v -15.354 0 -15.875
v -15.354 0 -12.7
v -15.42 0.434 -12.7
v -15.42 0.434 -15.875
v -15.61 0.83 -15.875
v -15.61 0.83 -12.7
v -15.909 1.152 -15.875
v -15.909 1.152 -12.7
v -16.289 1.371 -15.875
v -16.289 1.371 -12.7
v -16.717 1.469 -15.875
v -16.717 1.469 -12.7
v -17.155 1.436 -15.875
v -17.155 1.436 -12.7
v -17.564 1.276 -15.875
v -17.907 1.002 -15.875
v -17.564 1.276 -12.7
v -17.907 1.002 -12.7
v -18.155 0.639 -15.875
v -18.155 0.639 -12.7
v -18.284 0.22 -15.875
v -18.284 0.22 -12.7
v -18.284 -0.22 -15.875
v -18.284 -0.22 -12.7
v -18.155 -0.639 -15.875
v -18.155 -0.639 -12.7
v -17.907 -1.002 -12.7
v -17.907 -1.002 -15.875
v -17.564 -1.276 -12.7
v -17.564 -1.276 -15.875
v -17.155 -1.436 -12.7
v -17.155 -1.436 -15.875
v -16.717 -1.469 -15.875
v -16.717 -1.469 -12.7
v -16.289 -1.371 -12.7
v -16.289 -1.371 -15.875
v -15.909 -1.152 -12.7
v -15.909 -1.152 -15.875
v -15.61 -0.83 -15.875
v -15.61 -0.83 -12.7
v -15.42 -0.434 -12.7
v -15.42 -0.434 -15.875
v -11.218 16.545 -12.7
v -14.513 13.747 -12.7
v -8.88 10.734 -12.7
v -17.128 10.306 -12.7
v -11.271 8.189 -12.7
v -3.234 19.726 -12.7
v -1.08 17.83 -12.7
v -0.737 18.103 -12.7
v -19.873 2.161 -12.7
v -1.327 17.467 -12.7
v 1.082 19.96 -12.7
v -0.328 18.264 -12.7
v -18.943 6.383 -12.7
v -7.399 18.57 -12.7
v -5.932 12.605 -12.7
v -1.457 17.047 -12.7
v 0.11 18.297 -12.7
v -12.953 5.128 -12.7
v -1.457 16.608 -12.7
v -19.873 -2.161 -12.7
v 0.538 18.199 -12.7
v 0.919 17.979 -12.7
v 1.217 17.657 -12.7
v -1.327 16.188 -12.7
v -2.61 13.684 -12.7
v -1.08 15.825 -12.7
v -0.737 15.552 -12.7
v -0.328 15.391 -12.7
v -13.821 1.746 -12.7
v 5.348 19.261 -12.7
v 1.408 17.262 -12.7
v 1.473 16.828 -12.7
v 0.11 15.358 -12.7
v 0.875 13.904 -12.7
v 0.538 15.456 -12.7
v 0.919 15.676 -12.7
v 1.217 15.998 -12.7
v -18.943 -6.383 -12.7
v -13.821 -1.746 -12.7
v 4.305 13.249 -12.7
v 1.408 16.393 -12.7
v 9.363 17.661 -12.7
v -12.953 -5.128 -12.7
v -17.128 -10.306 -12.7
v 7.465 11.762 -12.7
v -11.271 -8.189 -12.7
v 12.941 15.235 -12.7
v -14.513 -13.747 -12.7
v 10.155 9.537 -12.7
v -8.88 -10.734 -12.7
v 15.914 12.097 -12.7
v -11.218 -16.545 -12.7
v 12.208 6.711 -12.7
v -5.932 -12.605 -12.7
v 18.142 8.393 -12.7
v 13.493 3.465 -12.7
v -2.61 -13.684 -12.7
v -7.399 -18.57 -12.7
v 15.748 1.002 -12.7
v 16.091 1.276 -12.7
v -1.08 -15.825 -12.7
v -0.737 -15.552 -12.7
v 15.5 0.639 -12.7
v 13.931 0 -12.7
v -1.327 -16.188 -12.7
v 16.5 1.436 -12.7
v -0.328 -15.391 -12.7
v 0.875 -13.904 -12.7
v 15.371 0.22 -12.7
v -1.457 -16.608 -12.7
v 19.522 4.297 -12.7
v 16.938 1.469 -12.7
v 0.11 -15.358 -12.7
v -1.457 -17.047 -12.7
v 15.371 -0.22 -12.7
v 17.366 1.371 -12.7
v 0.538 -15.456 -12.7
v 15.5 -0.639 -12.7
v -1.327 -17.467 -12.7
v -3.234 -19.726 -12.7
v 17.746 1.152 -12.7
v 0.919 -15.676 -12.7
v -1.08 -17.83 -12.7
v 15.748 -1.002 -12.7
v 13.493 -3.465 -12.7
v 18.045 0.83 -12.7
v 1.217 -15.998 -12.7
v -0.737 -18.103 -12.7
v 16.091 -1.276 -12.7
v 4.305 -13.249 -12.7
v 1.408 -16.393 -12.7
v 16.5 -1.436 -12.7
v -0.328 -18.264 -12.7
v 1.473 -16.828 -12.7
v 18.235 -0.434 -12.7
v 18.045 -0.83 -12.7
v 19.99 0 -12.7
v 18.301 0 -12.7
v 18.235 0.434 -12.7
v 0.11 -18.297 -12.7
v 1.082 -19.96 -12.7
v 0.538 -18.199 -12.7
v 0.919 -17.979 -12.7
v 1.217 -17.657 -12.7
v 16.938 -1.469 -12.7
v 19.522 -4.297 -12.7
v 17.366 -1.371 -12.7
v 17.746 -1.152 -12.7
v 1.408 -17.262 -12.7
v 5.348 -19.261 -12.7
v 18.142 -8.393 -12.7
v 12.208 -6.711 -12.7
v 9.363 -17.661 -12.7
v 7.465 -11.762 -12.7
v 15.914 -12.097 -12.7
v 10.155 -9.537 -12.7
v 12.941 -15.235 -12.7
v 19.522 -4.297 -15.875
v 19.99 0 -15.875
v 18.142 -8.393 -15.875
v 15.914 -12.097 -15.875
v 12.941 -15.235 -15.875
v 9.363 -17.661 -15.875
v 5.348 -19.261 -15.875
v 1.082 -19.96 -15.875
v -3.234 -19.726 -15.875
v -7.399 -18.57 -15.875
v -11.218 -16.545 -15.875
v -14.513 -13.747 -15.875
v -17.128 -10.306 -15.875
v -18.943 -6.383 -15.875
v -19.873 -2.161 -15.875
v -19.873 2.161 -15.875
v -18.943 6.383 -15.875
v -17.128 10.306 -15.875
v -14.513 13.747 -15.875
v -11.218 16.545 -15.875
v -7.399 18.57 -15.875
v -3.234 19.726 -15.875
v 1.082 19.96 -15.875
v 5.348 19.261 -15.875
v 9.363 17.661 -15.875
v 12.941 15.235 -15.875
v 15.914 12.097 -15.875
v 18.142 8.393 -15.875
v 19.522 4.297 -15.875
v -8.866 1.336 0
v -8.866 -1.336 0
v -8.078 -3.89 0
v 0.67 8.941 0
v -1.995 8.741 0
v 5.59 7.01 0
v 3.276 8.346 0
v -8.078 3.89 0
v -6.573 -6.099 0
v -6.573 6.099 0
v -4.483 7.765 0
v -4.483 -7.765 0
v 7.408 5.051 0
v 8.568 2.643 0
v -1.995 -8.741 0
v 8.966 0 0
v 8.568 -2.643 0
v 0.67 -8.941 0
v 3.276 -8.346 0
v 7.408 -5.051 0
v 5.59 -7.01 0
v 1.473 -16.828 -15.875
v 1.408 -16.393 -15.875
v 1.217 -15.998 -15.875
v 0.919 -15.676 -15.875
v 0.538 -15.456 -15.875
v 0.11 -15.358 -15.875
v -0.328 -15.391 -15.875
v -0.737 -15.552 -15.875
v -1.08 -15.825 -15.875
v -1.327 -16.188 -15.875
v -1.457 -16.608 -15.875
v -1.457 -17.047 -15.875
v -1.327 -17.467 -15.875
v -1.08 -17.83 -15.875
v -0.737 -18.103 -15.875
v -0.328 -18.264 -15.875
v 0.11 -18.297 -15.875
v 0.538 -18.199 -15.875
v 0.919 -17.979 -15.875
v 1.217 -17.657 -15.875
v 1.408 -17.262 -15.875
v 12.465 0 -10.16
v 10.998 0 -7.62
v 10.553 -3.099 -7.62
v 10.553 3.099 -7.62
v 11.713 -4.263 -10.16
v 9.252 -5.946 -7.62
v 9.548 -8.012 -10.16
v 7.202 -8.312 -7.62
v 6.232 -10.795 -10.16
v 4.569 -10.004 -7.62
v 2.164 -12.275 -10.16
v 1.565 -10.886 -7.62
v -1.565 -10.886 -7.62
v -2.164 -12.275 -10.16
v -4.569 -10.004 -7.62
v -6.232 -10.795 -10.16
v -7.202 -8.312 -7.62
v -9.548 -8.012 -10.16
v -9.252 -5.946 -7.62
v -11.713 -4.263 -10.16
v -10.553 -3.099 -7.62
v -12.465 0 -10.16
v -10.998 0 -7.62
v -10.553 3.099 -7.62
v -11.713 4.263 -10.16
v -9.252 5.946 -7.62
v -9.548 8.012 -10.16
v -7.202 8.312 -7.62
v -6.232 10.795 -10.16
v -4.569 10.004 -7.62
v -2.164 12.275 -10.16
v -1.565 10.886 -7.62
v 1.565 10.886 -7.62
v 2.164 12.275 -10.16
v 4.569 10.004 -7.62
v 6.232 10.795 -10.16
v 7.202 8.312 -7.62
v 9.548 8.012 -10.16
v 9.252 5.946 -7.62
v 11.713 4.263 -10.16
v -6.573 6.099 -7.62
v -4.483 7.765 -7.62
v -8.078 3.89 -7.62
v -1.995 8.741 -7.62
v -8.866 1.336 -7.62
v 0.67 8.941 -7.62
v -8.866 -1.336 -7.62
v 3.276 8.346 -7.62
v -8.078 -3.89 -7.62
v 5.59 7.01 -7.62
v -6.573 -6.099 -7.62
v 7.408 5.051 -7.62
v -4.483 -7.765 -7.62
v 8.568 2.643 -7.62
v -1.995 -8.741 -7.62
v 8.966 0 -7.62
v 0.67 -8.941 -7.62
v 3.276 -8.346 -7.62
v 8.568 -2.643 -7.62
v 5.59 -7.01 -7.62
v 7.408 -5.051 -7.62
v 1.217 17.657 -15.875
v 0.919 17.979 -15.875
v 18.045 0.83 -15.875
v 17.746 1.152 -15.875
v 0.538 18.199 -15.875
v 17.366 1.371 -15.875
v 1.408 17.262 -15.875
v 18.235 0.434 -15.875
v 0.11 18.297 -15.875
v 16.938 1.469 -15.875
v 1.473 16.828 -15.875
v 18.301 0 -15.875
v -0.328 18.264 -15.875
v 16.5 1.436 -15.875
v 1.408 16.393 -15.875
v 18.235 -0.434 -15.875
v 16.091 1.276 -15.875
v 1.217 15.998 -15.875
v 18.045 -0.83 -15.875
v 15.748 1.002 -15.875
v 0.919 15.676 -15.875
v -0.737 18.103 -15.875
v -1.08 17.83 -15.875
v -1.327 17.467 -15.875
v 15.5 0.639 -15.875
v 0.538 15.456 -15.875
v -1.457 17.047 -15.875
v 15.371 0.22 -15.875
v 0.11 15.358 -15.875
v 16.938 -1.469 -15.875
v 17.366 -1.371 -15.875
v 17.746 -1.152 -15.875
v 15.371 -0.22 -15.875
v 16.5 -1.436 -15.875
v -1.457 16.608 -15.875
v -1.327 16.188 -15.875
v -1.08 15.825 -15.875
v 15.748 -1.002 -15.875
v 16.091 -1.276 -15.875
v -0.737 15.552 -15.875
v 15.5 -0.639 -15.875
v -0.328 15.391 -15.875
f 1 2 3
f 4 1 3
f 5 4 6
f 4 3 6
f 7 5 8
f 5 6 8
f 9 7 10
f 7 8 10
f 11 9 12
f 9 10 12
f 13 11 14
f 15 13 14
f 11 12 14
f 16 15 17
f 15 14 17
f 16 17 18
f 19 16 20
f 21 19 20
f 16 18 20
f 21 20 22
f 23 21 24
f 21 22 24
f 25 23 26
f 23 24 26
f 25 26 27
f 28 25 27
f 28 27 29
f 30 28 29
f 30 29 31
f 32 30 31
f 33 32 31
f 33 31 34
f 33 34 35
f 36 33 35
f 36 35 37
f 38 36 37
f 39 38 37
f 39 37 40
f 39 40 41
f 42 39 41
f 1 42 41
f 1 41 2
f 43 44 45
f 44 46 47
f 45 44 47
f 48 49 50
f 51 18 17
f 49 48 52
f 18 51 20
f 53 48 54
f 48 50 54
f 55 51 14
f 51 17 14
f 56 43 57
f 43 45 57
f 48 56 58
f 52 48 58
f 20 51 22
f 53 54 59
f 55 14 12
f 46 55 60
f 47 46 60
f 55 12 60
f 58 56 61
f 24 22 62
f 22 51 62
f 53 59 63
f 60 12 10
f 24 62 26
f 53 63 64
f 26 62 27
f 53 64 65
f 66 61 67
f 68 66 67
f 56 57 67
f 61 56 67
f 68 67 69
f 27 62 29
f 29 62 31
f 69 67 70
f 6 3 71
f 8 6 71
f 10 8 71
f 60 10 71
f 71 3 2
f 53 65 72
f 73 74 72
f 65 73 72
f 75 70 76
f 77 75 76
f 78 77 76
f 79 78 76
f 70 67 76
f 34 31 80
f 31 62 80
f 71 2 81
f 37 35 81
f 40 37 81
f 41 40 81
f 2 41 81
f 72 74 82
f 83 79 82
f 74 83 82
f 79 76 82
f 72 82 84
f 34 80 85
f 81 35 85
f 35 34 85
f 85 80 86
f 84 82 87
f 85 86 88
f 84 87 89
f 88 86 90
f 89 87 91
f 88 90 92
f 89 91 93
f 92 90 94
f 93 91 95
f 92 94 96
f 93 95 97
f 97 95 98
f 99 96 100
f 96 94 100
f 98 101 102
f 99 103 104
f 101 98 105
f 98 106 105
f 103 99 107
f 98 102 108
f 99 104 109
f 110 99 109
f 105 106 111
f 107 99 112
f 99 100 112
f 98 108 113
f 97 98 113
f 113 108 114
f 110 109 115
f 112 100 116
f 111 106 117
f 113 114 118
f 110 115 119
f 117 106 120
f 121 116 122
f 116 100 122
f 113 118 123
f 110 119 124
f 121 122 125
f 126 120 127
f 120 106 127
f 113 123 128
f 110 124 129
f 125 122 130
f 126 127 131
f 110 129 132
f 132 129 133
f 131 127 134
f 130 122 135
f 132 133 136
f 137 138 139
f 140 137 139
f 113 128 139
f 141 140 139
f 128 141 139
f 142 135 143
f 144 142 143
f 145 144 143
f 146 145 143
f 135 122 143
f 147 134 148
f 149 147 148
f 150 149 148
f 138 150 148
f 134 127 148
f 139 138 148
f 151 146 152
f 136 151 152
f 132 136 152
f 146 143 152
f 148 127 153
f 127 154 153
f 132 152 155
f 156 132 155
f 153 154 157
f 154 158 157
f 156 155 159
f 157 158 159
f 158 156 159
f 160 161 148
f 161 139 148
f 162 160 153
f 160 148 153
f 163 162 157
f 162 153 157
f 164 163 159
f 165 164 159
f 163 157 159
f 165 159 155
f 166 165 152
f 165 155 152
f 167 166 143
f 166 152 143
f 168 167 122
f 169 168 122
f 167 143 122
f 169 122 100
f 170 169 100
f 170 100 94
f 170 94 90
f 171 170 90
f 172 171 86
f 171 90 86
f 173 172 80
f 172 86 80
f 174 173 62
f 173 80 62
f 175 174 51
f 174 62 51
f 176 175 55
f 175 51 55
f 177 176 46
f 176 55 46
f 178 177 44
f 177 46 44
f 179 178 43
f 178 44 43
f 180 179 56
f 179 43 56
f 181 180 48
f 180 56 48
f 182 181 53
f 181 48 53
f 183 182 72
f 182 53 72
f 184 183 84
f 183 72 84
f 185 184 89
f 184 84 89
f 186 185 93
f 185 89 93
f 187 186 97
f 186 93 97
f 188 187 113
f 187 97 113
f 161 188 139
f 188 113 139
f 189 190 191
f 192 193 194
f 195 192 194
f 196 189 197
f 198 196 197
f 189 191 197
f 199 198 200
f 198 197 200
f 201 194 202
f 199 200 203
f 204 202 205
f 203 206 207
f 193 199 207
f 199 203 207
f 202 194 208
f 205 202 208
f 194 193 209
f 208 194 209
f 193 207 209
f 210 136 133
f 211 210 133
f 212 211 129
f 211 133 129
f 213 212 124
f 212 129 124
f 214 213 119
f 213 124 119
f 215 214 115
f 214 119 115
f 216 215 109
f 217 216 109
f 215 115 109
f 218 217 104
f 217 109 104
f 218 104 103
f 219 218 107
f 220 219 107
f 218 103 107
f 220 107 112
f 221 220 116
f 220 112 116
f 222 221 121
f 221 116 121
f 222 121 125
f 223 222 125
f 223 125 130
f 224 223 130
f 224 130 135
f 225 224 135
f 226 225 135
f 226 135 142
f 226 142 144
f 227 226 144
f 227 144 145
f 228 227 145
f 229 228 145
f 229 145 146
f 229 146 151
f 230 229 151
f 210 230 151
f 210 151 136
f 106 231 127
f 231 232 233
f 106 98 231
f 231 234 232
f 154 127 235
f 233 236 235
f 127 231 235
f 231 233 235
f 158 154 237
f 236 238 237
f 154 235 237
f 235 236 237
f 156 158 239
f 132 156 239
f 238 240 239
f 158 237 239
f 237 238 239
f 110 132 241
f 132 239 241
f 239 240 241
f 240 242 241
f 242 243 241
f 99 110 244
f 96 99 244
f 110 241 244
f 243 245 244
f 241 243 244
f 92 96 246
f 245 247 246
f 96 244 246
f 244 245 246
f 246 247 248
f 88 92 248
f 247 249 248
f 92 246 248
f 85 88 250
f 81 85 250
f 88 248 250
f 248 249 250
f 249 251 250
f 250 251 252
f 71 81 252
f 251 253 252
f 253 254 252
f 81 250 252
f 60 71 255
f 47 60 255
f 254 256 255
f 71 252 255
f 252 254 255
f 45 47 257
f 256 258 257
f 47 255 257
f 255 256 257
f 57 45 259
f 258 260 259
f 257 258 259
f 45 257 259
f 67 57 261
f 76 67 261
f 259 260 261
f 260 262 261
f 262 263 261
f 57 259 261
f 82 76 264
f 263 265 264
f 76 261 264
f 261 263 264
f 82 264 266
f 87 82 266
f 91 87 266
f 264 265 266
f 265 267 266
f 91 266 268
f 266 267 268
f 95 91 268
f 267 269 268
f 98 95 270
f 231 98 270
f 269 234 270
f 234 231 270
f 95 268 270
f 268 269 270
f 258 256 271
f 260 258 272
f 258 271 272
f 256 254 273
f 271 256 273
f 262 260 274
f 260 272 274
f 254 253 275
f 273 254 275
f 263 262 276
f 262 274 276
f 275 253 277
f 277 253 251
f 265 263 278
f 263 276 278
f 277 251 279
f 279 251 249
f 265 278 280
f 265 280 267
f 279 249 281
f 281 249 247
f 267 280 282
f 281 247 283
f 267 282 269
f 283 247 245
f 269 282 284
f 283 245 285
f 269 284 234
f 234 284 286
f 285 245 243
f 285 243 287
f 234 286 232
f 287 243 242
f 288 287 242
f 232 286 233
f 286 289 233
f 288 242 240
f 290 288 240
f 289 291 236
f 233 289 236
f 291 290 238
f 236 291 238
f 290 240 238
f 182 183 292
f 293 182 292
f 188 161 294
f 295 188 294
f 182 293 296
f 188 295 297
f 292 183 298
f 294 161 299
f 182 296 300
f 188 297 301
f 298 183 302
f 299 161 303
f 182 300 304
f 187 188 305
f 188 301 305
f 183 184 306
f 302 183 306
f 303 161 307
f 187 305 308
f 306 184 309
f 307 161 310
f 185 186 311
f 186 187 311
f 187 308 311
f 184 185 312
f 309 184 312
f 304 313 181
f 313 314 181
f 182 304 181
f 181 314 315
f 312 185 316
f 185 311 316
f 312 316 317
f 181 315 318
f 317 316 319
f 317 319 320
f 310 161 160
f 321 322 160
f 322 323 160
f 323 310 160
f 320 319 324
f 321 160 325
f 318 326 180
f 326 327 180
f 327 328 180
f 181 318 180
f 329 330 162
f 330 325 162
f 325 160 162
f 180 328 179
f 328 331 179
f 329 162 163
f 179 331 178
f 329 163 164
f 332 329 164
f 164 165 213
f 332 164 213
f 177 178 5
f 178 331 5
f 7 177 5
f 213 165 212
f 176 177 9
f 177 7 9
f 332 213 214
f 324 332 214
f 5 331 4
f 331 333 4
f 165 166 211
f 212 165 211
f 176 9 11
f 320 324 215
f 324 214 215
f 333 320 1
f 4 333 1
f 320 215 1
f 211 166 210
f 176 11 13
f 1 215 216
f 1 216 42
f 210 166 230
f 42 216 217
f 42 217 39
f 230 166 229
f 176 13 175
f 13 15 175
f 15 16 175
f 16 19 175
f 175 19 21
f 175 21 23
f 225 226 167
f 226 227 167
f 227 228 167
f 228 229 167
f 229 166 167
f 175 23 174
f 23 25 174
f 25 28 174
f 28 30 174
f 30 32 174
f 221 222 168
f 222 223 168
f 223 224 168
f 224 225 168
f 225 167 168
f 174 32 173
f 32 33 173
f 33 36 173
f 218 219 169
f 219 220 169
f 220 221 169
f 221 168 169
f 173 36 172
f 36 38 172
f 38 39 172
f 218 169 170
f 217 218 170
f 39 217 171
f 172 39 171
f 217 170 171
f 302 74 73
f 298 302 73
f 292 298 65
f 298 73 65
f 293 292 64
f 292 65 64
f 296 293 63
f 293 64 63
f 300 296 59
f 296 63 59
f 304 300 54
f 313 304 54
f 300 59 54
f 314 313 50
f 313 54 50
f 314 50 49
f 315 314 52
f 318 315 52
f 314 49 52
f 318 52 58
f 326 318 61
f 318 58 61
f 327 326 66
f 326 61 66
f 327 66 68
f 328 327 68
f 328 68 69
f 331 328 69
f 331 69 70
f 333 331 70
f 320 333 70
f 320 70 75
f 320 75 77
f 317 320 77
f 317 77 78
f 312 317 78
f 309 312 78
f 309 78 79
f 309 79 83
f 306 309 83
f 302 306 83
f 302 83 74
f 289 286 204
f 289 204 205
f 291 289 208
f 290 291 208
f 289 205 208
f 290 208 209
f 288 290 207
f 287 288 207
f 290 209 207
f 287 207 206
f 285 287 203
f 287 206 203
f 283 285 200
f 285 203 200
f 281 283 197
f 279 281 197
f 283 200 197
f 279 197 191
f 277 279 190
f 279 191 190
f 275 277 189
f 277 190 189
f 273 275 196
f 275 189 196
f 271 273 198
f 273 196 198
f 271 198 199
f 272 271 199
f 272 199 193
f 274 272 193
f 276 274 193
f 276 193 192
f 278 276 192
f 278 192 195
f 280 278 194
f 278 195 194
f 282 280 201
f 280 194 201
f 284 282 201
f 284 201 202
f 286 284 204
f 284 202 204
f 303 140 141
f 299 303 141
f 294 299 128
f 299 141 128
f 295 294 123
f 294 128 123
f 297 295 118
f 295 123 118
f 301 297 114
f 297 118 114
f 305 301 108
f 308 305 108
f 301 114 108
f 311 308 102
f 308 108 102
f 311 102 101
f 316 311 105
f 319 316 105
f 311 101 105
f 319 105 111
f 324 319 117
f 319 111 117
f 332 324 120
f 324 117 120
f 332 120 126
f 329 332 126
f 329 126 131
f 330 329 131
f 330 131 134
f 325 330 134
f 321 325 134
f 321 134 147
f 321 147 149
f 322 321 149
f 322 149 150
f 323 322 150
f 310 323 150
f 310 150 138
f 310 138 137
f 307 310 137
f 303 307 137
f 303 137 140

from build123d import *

# Parameters (mm, degrees)
F_4_CLEARANCE_HOLE1_D = 2.9464


with BuildPart() as part:
    # Sketch2 → Revolve1 (revolve)
    with BuildSketch(Plane(origin=(0, 0, 0), x_dir=(0, 0, -1), z_dir=(1, 0, 0)), mode=Mode.PRIVATE) as revolve1_sk:
        Polygon((0, 0), (15.875, 0), (15.875, 17.280736743), (15.875, 19.9898), (12.7, 19.9898), (12.7, 13.931139367), (7.62, 10.9982), (7.62, 8.9662), (0, 8.9662), align=None)
    revolve(revolve1_sk.sketch.rotate(Axis((0, 0, 0), (0, 0, -1)), 90), axis=Axis((0, 0, 0), (0, 0, -1)))

    # #4 Clearance Hole1 (through all)
    with Locations(Plane(origin=(0, 0, -15.875), x_dir=(-1, 0, 0), z_dir=(0, 0, -1))):
        with Locations((0, 16.8275), (-16.8275, 0), (16.8275, 0), (0, -16.8275)):
            Hole(F_4_CLEARANCE_HOLE1_D / 2)


solid = part.part
